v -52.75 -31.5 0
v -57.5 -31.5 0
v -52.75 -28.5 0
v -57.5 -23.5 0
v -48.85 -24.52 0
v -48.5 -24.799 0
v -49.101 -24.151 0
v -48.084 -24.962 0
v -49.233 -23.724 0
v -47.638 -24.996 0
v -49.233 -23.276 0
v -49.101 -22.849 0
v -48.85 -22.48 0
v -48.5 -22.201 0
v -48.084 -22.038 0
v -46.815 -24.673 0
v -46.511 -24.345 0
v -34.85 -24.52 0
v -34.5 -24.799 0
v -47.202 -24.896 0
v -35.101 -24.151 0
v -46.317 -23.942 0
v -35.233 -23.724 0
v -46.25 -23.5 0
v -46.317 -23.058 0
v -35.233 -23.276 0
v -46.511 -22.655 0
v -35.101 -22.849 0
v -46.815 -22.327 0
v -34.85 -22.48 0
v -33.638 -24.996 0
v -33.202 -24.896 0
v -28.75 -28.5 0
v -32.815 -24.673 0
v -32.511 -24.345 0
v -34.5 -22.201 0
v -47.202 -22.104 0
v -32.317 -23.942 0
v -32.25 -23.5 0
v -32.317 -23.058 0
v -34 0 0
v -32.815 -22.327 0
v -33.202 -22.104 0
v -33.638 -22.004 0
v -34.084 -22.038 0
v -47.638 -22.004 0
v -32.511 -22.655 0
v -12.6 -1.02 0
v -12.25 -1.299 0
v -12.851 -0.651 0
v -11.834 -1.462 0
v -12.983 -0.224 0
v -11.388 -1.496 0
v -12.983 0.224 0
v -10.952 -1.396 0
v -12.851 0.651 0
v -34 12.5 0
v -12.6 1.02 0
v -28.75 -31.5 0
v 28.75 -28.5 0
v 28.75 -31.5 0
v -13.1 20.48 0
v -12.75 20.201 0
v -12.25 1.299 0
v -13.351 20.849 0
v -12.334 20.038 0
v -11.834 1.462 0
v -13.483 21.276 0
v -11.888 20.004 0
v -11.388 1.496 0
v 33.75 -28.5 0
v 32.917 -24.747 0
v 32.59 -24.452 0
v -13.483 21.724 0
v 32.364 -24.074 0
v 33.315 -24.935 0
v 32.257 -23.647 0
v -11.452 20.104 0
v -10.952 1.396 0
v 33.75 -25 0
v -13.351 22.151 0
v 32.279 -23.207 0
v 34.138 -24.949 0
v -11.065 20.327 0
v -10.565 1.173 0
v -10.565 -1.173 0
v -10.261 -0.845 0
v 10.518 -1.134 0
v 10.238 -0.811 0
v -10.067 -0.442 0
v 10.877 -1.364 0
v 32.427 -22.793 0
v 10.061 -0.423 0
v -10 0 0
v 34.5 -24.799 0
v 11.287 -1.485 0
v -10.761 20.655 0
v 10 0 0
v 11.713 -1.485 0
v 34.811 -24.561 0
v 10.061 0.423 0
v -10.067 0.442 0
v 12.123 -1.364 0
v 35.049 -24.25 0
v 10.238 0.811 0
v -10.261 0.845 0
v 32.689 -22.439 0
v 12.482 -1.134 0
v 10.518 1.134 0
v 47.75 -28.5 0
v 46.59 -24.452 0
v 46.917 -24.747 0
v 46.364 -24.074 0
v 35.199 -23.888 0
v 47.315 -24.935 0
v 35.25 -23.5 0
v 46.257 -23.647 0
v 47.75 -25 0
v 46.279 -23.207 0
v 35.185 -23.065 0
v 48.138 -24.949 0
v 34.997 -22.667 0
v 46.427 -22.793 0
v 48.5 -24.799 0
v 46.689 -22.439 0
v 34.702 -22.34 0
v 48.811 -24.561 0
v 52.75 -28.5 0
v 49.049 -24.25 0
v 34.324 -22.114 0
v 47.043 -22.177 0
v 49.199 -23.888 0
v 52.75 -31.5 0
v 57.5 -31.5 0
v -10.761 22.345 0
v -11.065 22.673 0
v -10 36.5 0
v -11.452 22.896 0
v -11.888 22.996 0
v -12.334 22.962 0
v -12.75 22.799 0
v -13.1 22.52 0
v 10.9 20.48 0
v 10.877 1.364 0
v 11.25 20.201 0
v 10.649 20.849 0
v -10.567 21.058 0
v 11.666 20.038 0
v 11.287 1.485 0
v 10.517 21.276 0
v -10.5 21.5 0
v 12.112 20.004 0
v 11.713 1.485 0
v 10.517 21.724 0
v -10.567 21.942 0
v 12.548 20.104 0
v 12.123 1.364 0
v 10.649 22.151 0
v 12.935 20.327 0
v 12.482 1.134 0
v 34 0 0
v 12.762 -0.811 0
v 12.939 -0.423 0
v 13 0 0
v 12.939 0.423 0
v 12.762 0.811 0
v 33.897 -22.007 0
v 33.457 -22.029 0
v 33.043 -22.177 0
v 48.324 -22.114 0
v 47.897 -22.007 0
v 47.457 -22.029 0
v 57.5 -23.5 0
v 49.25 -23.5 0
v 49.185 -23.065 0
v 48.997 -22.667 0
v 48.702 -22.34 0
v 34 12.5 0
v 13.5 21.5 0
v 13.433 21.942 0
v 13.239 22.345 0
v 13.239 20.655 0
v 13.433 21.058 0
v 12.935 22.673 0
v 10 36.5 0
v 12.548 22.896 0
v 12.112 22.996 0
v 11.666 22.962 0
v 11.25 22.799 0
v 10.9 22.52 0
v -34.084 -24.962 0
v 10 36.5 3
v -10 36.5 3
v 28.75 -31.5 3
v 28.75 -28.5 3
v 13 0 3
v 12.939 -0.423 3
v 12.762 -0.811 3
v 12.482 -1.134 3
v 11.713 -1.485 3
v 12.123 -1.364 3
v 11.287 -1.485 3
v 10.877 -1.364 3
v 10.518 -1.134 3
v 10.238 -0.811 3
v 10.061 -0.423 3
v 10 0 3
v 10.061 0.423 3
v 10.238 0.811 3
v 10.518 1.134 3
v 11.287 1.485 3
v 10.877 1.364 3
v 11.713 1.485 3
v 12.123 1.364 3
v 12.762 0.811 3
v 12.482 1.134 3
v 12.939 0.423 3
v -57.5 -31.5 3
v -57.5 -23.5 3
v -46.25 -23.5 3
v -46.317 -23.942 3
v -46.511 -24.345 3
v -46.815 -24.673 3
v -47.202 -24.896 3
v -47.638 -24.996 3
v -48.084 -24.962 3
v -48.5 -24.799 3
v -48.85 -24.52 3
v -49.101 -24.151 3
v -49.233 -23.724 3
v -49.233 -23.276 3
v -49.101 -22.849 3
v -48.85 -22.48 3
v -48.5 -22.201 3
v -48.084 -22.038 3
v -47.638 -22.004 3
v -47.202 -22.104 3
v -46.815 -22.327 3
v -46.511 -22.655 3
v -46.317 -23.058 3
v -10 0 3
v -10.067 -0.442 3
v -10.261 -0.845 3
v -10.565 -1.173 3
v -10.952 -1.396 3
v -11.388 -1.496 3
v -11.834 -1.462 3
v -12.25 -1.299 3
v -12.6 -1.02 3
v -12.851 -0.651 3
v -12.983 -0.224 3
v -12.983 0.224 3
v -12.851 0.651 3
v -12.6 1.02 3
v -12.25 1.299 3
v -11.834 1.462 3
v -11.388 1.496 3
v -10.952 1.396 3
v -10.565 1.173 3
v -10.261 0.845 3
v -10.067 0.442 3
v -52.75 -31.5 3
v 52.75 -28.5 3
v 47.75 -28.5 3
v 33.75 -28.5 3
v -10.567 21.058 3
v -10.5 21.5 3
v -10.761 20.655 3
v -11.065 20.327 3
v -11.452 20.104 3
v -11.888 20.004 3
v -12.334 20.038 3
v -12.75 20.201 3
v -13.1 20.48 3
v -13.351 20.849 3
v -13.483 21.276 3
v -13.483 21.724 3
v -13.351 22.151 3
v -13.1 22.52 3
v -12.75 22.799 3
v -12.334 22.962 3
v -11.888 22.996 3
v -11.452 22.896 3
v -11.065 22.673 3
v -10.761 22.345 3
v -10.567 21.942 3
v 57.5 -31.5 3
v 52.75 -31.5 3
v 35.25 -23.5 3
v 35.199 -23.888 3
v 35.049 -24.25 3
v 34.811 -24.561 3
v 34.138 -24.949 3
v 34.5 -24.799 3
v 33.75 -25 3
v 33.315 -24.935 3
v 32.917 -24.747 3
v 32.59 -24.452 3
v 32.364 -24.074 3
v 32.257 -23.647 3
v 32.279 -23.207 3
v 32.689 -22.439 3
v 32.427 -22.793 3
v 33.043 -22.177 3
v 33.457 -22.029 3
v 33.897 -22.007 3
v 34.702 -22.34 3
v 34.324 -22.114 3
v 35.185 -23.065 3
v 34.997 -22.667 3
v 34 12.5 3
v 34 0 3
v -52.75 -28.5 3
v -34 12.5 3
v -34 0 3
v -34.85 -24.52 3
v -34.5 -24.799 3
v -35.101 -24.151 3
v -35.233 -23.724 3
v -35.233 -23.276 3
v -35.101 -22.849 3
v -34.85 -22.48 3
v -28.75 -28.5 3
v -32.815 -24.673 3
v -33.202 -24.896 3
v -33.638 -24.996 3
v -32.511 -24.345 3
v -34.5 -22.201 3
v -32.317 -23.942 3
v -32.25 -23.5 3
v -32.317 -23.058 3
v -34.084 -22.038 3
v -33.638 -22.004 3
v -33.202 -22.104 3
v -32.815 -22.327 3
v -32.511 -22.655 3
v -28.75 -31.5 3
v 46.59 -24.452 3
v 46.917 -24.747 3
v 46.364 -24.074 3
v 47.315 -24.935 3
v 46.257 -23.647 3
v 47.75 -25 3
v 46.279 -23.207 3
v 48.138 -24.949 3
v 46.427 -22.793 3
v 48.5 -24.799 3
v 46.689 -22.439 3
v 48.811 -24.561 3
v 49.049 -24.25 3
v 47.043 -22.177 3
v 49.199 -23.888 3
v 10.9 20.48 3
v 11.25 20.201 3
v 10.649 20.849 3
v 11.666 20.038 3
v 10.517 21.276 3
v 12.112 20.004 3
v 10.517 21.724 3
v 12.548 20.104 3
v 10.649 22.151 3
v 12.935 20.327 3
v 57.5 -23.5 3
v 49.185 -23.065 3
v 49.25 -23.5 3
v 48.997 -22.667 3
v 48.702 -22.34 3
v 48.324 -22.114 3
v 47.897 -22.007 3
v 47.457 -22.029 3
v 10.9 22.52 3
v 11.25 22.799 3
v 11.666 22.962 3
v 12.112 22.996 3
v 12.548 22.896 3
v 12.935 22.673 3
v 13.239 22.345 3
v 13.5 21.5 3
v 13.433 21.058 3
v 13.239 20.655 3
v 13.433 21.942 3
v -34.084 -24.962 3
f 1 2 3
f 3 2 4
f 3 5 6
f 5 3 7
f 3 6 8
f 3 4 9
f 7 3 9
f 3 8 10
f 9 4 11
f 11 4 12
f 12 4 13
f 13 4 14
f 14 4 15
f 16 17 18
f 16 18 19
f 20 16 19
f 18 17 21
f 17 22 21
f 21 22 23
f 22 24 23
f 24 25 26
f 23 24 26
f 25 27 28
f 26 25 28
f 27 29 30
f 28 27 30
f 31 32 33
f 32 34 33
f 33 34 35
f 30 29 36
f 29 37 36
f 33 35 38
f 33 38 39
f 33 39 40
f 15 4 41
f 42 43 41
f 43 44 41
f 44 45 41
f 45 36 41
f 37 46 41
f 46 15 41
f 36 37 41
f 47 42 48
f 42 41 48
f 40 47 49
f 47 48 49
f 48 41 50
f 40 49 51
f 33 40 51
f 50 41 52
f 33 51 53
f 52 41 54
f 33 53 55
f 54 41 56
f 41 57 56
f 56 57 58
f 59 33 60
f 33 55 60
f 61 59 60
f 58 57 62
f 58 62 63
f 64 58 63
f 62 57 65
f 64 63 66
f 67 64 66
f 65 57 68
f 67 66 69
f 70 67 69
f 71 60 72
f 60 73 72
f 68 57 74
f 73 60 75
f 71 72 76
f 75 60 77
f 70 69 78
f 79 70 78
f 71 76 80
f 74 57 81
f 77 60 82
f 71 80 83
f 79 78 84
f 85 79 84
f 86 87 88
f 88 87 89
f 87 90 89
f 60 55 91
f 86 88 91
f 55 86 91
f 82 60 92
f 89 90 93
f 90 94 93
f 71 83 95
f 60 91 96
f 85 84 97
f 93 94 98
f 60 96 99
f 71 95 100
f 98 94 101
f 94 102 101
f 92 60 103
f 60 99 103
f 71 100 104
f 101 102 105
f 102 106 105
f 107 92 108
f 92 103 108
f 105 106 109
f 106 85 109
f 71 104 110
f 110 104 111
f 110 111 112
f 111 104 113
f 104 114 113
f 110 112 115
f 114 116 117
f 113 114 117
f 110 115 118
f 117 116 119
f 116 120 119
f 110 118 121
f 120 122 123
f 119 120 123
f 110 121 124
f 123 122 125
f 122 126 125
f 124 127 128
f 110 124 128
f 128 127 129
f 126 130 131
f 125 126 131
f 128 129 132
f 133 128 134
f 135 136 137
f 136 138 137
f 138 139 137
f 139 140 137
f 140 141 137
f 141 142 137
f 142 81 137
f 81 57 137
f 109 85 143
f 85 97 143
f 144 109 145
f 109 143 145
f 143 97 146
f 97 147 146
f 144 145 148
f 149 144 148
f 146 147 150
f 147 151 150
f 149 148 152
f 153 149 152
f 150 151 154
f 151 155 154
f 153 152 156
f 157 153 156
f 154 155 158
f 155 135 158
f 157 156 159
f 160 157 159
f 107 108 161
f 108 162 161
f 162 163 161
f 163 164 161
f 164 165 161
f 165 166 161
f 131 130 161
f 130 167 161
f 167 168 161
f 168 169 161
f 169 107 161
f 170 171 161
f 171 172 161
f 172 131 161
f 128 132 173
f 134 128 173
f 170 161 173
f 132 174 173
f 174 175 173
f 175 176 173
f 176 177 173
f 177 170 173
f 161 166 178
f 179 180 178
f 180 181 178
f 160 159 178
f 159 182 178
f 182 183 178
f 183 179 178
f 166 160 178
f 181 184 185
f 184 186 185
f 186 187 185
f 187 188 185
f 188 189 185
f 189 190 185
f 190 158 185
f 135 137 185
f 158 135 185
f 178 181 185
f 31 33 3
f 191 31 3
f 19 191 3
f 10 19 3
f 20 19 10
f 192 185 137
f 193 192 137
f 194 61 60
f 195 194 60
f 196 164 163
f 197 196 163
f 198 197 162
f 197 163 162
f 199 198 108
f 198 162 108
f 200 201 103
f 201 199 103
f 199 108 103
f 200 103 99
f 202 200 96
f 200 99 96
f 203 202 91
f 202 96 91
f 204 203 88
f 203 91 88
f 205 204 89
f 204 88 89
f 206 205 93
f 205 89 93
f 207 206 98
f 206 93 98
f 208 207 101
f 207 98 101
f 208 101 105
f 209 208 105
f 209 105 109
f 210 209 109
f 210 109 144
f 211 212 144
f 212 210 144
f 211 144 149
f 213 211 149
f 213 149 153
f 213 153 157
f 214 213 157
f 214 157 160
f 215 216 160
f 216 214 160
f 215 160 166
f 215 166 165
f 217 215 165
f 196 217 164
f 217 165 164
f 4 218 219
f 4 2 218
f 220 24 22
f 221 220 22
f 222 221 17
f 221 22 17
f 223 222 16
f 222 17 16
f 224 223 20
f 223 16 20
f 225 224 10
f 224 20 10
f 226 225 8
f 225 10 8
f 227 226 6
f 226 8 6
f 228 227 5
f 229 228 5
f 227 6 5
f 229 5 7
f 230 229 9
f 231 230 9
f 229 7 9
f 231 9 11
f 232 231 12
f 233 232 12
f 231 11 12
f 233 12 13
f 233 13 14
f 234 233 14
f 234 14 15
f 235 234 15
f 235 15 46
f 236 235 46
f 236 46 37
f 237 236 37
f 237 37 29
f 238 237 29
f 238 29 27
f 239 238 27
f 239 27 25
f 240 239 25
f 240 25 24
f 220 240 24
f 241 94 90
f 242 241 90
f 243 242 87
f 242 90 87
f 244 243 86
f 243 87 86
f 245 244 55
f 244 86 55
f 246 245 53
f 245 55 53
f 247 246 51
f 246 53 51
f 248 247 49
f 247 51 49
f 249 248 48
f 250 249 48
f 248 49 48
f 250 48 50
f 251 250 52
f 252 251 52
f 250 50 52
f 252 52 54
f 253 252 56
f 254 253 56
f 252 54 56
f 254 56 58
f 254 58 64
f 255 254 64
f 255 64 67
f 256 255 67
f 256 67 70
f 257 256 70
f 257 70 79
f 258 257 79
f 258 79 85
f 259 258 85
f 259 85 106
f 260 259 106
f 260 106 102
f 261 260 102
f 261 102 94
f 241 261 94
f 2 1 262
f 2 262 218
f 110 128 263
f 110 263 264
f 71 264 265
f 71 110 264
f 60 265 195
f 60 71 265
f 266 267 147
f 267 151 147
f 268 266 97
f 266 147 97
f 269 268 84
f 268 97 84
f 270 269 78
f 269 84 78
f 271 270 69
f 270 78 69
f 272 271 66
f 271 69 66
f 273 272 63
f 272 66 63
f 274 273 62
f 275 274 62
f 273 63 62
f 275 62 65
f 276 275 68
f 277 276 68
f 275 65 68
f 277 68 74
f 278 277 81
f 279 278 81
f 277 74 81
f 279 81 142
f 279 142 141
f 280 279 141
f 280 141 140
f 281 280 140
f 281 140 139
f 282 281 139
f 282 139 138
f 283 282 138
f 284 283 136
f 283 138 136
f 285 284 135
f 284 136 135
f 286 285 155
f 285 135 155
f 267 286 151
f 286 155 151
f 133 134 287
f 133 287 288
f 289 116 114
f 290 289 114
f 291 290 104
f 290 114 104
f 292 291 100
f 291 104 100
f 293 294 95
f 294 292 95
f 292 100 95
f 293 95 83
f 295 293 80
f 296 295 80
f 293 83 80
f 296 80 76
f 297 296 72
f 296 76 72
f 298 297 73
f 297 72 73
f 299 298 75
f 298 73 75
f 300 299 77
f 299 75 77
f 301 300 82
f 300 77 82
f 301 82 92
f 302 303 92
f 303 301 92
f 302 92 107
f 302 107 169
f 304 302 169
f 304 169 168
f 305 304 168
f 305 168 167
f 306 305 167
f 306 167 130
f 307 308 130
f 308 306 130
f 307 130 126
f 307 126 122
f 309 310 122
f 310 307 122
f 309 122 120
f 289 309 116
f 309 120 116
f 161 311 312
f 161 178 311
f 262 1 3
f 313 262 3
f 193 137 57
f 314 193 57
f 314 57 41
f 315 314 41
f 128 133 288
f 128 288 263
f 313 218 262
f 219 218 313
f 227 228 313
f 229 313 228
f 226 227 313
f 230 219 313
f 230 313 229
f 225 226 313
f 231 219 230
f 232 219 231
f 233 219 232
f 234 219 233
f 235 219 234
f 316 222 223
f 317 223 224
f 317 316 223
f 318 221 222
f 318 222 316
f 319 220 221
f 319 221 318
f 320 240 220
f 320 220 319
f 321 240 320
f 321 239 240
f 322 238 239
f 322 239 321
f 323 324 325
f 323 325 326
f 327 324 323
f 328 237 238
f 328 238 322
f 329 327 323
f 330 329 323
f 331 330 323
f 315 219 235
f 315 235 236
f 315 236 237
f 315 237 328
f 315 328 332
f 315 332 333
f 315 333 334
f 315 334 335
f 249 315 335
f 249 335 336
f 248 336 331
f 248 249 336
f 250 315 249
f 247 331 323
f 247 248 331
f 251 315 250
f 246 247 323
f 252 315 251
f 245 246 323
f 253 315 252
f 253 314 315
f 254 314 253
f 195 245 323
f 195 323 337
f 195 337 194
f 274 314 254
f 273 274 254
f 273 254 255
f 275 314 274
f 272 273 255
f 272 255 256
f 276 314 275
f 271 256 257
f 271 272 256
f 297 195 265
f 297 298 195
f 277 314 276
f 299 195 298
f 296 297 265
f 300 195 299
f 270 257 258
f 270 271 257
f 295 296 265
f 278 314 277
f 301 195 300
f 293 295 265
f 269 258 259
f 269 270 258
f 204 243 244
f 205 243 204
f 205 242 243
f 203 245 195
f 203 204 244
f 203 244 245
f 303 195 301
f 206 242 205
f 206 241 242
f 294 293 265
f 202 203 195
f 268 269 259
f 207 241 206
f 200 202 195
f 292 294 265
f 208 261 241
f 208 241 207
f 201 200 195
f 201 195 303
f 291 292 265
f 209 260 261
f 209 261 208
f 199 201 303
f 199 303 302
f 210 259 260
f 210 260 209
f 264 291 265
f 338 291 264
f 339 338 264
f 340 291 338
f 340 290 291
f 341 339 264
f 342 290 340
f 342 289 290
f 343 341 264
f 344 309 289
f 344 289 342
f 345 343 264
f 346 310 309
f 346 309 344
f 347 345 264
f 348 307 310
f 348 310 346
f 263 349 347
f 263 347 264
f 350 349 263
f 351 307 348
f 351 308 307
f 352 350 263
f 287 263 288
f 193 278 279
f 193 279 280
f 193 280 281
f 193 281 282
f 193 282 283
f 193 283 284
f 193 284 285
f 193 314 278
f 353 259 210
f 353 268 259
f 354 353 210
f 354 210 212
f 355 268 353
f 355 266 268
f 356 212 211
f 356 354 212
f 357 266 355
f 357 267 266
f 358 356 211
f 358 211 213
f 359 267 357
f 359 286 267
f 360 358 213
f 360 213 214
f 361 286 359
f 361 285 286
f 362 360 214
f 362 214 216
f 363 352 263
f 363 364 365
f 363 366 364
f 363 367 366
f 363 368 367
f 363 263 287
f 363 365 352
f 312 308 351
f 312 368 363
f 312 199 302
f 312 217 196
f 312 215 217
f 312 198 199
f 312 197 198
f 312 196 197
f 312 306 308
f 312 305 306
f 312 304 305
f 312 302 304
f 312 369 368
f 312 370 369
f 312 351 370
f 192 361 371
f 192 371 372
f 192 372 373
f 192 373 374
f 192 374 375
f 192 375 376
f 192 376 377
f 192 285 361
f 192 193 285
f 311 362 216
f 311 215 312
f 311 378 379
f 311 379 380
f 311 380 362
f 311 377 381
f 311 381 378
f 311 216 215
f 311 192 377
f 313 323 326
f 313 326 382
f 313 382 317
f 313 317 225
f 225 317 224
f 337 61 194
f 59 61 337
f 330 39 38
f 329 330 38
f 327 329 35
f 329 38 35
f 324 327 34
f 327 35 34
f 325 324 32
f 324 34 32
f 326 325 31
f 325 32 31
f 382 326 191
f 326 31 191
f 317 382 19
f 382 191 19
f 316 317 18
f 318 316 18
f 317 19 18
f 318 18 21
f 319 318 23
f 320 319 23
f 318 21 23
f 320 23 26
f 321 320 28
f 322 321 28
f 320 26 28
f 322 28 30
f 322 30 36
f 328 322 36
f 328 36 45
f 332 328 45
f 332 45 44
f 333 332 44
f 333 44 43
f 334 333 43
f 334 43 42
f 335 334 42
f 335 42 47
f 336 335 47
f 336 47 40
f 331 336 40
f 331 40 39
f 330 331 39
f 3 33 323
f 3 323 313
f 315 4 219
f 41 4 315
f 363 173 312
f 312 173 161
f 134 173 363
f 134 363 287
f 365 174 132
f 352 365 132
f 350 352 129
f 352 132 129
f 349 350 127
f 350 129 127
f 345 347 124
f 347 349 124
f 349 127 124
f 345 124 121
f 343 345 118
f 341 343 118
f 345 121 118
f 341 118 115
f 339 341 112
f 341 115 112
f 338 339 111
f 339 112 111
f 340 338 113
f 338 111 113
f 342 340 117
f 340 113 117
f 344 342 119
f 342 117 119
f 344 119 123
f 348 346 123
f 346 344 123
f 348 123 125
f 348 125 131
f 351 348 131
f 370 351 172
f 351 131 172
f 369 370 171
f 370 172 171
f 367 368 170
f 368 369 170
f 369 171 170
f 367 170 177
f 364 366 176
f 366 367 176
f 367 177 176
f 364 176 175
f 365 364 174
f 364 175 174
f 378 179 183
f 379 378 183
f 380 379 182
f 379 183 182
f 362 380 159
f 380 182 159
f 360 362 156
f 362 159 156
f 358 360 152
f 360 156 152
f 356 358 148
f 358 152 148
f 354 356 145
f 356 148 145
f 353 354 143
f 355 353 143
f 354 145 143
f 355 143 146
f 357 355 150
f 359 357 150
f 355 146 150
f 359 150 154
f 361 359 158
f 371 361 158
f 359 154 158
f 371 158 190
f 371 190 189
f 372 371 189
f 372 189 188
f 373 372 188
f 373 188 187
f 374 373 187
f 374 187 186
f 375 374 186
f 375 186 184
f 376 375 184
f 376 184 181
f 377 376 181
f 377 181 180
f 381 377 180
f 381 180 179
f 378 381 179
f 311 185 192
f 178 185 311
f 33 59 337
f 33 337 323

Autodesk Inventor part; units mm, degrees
ref_plane "YZ Plane" through (0, 0, 0) normal (1, 0, 0) x (0, 1, 0)
ref_plane "XZ Plane" through (0, 0, 0) normal (0, 1, 0) x (-1, 0, 0)
ref_plane "XY Plane" through (0, 0, 0) normal (0, 0, 1) x (1, 0, 0)
sketch "Эскиз1" plane through (0, 0, 0) normal (0, 0, 1) x (1, 0, 0)
  line L0 (57.5, -31.5) -> (-57.5, -31.5)
  line L1 (-57.5, -31.5) -> (-57.5, 31.5)
  line L2 (-57.5, 31.5) -> (57.5, 31.5)
  line L3 (57.5, 31.5) -> (57.5, -31.5)
  line L4 (57.5, -31.5) -> (-57.5, 31.5) construction
  line L5 (-57.5, -31.5) -> (57.5, 31.5) construction
  line L6 (0, 0) -> (0, 31.5)
  line L7 (0, 31.5) -> (12, 31.5)
  line L8 (12, 31.5) -> (12, 21.5)
  line L9 (12, 21.5) -> (0, 21.5)
  line L10 (0, 21.5) -> (0, 31.5)
  line L11 (0, 31.5) -> (-12, 31.5)
  line L12 (-12, 31.5) -> (-12, 21.5)
  line L13 (-12, 21.5) -> (0, 21.5)
  line L14 (0, 21.5) -> (0, 31.5)
  circle A0 centre (-12, 21.5) radius 1.5
  circle A1 centre (12, 21.5) radius 1.5
  line L15 (0, 0) -> (-33.75, 0)
  line L16 (-33.75, 0) -> (-33.75, -31.5)
  line L17 (-33.75, -31.5) -> (0, -31.5)
  line L18 (0, -31.5) -> (0, 0)
  line L19 (0, -31.5) -> (-33.75, -31.5)
  line L20 (-33.75, -31.5) -> (-33.75, -23.5)
  line L21 (-33.75, -23.5) -> (0, -23.5)
  line L22 (0, -23.5) -> (0, -31.5)
  line L23 (-57.5, -31.5) -> (57.5, -31.5)
  line L24 (57.5, -31.5) -> (57.5, -28.5)
  line L25 (57.5, -28.5) -> (-57.5, -28.5)
  line L26 (-57.5, -28.5) -> (-57.5, -31.5)
  circle A2 centre (-33.75, -23.5) radius 1.5
  line L27 (-33.75, -23.5) -> (-47.75, -23.5)
  line L28 (-47.75, -23.5) -> (-47.75, -31.5)
  line L29 (-47.75, -31.5) -> (-33.75, -31.5)
  line L30 (-33.75, -31.5) -> (-33.75, -23.5)
  circle A3 centre (-47.75, -23.5) radius 1.5
  line L31 (33.75, -31.5) -> (33.75, -23.5)
  circle A4 centre (33.75, -23.5) radius 1.5
  line L32 (47.75, -23.5) -> (47.75, -31.5)
  circle A5 centre (47.75, -23.5) radius 1.5
  line L33 (0, 0) -> (11.5, 0)
  circle A6 centre (11.5, 0) radius 1.5
  circle A7 centre (-11.5, 0) radius 1.5
  line L34 (-33.75, -31.5) -> (-28.75, -31.5)
  line L35 (-28.75, -31.5) -> (-28.75, -28.5)
  line L36 (-28.75, -28.5) -> (-33.75, -28.5)
  line L37 (-33.75, -28.5) -> (-33.75, -31.5)
  line L38 (-47.75, -31.5) -> (-52.75, -31.5)
  line L39 (-52.75, -31.5) -> (-52.75, -28.5)
  line L40 (-52.75, -28.5) -> (-47.75, -28.5)
  line L41 (-47.75, -28.5) -> (-47.75, -31.5)
  line L42 (28.75, -31.5) -> (28.75, -28.5)
  line L43 (52.75, -31.5) -> (52.75, -28.5)
  line L44 (-47.75, -23.5) -> (-57.5, -23.5)
  line L45 (-57.5, -23.5) -> (-34, 0)
  line L46 (-57.5, -23.5) -> (-24.266, -23.5) construction
  line L47 (-12, 31.5) -> (-34, 9.5)
  line L48 (-12, 31.5) -> (19.1127, 31.5) construction
  line L49 (-34, 9.5) -> (-34, 0)
  line L50 (-57.5, -31.5) -> (57.5, 31.5) construction
  line L51 (57.5, -23.5) -> (34, 0)
  line L52 (12, 31.5) -> (34, 9.5)
  line L53 (34, 9.5) -> (34, 0)
  line L54 (34, 9.5) -> (34, 31.5)
  line L55 (-34, 9.5) -> (-34, 31.5)
  line L56 (12, 31.5) -> (15, 31.5)
  line L57 (15, 31.5) -> (34, 12.5)
  line L58 (-12, 31.5) -> (-15, 31.5)
  line L59 (-15, 31.5) -> (-34, 12.5)
  line L60 (-57.5, 31.5) -> (57.5, 31.5)
  line L61 (57.5, 31.5) -> (57.5, 36.5)
  line L62 (57.5, 36.5) -> (-57.5, 36.5)
  line L63 (-57.5, 36.5) -> (-57.5, 31.5)
  line L64 (-15, 31.5) -> (-10, 36.5)
  line L65 (15, 31.5) -> (10, 36.5)
  point P0 (-47.75, -28.5)
  point P1 (-33.75, -28.5)
  point P2 (33.75, -28.5)
  point P3 (47.75, -28.5)
  dimension "d0" = 115
  dimension "d1" = 63
  dimension "d2" = 12
  dimension "d3" = 10
  dimension "d4" = 12
  dimension "d5" = 3
  dimension "d6" = 3
  dimension "d7" = 33.75
  dimension "d8" = 8
  dimension "d9" = 3
  dimension "d10" = 3
  dimension "d11" = 14
  dimension "d12" = 3
  dimension "d13" = 11.5
  dimension "d14" = 3
  dimension "d17" = 5
  dimension "d18" = 5
  dimension "d19" = 45
  dimension "d20" = 135
  dimension "d21" = 3
  dimension "d22" = 135
  dimension "d23" = 3
  dimension "d24" = 5
extrude "Выдавливание1" add sketch "Эскиз1" along normal blind 3 contours L0 L43 L25 L3 | L25 L18 L6 L9 A1 L8 L52 L53 L51 L3 | L0 L18 L25 L42 | L52 L2 L57 L54 | L0 L35 L25 L18 | L2 L64 L62 L65 | L8 A1 L9 L6 L2 | L25 L16 A2 L21 L18 | L6 L13 A0 L12 L2 | L21 A2 L16 L15 A7 L18 | L2 L47 L55 L59 | L12 A0 L13 L6 L15 A7 L16 A2 L27 A3 L44 L45 L49 L47 | L25 L28 A3 L27 A2 L16 | L0 L1 L25 L39 | L25 L1 L44 A3 L28
properties part number "дно"
